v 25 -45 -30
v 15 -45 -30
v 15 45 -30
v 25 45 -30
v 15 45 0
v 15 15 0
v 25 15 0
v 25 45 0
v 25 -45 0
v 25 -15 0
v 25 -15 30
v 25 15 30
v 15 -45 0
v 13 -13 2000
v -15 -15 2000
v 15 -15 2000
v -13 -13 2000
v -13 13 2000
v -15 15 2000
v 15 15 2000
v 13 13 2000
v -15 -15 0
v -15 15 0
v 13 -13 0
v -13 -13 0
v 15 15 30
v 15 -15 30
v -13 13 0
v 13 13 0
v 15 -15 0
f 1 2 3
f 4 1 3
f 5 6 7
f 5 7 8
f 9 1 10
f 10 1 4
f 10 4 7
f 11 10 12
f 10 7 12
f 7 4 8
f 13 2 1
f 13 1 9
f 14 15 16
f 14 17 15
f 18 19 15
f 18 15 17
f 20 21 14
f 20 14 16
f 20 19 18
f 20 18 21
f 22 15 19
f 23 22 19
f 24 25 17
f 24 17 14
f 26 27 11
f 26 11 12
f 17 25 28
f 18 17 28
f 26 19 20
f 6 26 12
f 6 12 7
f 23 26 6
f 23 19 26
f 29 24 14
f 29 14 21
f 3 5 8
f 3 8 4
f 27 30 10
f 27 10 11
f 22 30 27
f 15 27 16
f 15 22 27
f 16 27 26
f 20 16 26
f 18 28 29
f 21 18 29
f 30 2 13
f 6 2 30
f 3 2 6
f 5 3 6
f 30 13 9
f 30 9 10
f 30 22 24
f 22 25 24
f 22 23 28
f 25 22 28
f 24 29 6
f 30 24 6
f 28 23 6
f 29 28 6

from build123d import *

# Parameters (mm, degrees)
SKETCH1_W           = 30
SKETCH1_H           = 30
SKETCH1_W_2         = 26
SKETCH1_H_2         = 26
BOSS_EXTRUDE1_DEPTH = 2000
BOSS_EXTRUDE2_DEPTH = 10


with BuildPart() as part:
    # Sketch1 → Boss-Extrude1 (new body)
    with BuildSketch(Plane.XY):
        Rectangle(SKETCH1_W, SKETCH1_H)
        Rectangle(SKETCH1_W_2, SKETCH1_H_2, mode=Mode.SUBTRACT)
    extrude(amount=BOSS_EXTRUDE1_DEPTH)

    # Sketch2 → Boss-Extrude2 (add)
    with BuildSketch(Plane(origin=(15, 0, 0), x_dir=(0, 0, -1), z_dir=(1, 0, 0))):
        Polygon((-30, 15), (0, 15), (0, 45), (30, 45), (30, 15), (30, -15), (30, -45), (0, -45), (0, -15), (-30, -15), align=None)
    extrude(amount=BOSS_EXTRUDE2_DEPTH)


solid = part.part
